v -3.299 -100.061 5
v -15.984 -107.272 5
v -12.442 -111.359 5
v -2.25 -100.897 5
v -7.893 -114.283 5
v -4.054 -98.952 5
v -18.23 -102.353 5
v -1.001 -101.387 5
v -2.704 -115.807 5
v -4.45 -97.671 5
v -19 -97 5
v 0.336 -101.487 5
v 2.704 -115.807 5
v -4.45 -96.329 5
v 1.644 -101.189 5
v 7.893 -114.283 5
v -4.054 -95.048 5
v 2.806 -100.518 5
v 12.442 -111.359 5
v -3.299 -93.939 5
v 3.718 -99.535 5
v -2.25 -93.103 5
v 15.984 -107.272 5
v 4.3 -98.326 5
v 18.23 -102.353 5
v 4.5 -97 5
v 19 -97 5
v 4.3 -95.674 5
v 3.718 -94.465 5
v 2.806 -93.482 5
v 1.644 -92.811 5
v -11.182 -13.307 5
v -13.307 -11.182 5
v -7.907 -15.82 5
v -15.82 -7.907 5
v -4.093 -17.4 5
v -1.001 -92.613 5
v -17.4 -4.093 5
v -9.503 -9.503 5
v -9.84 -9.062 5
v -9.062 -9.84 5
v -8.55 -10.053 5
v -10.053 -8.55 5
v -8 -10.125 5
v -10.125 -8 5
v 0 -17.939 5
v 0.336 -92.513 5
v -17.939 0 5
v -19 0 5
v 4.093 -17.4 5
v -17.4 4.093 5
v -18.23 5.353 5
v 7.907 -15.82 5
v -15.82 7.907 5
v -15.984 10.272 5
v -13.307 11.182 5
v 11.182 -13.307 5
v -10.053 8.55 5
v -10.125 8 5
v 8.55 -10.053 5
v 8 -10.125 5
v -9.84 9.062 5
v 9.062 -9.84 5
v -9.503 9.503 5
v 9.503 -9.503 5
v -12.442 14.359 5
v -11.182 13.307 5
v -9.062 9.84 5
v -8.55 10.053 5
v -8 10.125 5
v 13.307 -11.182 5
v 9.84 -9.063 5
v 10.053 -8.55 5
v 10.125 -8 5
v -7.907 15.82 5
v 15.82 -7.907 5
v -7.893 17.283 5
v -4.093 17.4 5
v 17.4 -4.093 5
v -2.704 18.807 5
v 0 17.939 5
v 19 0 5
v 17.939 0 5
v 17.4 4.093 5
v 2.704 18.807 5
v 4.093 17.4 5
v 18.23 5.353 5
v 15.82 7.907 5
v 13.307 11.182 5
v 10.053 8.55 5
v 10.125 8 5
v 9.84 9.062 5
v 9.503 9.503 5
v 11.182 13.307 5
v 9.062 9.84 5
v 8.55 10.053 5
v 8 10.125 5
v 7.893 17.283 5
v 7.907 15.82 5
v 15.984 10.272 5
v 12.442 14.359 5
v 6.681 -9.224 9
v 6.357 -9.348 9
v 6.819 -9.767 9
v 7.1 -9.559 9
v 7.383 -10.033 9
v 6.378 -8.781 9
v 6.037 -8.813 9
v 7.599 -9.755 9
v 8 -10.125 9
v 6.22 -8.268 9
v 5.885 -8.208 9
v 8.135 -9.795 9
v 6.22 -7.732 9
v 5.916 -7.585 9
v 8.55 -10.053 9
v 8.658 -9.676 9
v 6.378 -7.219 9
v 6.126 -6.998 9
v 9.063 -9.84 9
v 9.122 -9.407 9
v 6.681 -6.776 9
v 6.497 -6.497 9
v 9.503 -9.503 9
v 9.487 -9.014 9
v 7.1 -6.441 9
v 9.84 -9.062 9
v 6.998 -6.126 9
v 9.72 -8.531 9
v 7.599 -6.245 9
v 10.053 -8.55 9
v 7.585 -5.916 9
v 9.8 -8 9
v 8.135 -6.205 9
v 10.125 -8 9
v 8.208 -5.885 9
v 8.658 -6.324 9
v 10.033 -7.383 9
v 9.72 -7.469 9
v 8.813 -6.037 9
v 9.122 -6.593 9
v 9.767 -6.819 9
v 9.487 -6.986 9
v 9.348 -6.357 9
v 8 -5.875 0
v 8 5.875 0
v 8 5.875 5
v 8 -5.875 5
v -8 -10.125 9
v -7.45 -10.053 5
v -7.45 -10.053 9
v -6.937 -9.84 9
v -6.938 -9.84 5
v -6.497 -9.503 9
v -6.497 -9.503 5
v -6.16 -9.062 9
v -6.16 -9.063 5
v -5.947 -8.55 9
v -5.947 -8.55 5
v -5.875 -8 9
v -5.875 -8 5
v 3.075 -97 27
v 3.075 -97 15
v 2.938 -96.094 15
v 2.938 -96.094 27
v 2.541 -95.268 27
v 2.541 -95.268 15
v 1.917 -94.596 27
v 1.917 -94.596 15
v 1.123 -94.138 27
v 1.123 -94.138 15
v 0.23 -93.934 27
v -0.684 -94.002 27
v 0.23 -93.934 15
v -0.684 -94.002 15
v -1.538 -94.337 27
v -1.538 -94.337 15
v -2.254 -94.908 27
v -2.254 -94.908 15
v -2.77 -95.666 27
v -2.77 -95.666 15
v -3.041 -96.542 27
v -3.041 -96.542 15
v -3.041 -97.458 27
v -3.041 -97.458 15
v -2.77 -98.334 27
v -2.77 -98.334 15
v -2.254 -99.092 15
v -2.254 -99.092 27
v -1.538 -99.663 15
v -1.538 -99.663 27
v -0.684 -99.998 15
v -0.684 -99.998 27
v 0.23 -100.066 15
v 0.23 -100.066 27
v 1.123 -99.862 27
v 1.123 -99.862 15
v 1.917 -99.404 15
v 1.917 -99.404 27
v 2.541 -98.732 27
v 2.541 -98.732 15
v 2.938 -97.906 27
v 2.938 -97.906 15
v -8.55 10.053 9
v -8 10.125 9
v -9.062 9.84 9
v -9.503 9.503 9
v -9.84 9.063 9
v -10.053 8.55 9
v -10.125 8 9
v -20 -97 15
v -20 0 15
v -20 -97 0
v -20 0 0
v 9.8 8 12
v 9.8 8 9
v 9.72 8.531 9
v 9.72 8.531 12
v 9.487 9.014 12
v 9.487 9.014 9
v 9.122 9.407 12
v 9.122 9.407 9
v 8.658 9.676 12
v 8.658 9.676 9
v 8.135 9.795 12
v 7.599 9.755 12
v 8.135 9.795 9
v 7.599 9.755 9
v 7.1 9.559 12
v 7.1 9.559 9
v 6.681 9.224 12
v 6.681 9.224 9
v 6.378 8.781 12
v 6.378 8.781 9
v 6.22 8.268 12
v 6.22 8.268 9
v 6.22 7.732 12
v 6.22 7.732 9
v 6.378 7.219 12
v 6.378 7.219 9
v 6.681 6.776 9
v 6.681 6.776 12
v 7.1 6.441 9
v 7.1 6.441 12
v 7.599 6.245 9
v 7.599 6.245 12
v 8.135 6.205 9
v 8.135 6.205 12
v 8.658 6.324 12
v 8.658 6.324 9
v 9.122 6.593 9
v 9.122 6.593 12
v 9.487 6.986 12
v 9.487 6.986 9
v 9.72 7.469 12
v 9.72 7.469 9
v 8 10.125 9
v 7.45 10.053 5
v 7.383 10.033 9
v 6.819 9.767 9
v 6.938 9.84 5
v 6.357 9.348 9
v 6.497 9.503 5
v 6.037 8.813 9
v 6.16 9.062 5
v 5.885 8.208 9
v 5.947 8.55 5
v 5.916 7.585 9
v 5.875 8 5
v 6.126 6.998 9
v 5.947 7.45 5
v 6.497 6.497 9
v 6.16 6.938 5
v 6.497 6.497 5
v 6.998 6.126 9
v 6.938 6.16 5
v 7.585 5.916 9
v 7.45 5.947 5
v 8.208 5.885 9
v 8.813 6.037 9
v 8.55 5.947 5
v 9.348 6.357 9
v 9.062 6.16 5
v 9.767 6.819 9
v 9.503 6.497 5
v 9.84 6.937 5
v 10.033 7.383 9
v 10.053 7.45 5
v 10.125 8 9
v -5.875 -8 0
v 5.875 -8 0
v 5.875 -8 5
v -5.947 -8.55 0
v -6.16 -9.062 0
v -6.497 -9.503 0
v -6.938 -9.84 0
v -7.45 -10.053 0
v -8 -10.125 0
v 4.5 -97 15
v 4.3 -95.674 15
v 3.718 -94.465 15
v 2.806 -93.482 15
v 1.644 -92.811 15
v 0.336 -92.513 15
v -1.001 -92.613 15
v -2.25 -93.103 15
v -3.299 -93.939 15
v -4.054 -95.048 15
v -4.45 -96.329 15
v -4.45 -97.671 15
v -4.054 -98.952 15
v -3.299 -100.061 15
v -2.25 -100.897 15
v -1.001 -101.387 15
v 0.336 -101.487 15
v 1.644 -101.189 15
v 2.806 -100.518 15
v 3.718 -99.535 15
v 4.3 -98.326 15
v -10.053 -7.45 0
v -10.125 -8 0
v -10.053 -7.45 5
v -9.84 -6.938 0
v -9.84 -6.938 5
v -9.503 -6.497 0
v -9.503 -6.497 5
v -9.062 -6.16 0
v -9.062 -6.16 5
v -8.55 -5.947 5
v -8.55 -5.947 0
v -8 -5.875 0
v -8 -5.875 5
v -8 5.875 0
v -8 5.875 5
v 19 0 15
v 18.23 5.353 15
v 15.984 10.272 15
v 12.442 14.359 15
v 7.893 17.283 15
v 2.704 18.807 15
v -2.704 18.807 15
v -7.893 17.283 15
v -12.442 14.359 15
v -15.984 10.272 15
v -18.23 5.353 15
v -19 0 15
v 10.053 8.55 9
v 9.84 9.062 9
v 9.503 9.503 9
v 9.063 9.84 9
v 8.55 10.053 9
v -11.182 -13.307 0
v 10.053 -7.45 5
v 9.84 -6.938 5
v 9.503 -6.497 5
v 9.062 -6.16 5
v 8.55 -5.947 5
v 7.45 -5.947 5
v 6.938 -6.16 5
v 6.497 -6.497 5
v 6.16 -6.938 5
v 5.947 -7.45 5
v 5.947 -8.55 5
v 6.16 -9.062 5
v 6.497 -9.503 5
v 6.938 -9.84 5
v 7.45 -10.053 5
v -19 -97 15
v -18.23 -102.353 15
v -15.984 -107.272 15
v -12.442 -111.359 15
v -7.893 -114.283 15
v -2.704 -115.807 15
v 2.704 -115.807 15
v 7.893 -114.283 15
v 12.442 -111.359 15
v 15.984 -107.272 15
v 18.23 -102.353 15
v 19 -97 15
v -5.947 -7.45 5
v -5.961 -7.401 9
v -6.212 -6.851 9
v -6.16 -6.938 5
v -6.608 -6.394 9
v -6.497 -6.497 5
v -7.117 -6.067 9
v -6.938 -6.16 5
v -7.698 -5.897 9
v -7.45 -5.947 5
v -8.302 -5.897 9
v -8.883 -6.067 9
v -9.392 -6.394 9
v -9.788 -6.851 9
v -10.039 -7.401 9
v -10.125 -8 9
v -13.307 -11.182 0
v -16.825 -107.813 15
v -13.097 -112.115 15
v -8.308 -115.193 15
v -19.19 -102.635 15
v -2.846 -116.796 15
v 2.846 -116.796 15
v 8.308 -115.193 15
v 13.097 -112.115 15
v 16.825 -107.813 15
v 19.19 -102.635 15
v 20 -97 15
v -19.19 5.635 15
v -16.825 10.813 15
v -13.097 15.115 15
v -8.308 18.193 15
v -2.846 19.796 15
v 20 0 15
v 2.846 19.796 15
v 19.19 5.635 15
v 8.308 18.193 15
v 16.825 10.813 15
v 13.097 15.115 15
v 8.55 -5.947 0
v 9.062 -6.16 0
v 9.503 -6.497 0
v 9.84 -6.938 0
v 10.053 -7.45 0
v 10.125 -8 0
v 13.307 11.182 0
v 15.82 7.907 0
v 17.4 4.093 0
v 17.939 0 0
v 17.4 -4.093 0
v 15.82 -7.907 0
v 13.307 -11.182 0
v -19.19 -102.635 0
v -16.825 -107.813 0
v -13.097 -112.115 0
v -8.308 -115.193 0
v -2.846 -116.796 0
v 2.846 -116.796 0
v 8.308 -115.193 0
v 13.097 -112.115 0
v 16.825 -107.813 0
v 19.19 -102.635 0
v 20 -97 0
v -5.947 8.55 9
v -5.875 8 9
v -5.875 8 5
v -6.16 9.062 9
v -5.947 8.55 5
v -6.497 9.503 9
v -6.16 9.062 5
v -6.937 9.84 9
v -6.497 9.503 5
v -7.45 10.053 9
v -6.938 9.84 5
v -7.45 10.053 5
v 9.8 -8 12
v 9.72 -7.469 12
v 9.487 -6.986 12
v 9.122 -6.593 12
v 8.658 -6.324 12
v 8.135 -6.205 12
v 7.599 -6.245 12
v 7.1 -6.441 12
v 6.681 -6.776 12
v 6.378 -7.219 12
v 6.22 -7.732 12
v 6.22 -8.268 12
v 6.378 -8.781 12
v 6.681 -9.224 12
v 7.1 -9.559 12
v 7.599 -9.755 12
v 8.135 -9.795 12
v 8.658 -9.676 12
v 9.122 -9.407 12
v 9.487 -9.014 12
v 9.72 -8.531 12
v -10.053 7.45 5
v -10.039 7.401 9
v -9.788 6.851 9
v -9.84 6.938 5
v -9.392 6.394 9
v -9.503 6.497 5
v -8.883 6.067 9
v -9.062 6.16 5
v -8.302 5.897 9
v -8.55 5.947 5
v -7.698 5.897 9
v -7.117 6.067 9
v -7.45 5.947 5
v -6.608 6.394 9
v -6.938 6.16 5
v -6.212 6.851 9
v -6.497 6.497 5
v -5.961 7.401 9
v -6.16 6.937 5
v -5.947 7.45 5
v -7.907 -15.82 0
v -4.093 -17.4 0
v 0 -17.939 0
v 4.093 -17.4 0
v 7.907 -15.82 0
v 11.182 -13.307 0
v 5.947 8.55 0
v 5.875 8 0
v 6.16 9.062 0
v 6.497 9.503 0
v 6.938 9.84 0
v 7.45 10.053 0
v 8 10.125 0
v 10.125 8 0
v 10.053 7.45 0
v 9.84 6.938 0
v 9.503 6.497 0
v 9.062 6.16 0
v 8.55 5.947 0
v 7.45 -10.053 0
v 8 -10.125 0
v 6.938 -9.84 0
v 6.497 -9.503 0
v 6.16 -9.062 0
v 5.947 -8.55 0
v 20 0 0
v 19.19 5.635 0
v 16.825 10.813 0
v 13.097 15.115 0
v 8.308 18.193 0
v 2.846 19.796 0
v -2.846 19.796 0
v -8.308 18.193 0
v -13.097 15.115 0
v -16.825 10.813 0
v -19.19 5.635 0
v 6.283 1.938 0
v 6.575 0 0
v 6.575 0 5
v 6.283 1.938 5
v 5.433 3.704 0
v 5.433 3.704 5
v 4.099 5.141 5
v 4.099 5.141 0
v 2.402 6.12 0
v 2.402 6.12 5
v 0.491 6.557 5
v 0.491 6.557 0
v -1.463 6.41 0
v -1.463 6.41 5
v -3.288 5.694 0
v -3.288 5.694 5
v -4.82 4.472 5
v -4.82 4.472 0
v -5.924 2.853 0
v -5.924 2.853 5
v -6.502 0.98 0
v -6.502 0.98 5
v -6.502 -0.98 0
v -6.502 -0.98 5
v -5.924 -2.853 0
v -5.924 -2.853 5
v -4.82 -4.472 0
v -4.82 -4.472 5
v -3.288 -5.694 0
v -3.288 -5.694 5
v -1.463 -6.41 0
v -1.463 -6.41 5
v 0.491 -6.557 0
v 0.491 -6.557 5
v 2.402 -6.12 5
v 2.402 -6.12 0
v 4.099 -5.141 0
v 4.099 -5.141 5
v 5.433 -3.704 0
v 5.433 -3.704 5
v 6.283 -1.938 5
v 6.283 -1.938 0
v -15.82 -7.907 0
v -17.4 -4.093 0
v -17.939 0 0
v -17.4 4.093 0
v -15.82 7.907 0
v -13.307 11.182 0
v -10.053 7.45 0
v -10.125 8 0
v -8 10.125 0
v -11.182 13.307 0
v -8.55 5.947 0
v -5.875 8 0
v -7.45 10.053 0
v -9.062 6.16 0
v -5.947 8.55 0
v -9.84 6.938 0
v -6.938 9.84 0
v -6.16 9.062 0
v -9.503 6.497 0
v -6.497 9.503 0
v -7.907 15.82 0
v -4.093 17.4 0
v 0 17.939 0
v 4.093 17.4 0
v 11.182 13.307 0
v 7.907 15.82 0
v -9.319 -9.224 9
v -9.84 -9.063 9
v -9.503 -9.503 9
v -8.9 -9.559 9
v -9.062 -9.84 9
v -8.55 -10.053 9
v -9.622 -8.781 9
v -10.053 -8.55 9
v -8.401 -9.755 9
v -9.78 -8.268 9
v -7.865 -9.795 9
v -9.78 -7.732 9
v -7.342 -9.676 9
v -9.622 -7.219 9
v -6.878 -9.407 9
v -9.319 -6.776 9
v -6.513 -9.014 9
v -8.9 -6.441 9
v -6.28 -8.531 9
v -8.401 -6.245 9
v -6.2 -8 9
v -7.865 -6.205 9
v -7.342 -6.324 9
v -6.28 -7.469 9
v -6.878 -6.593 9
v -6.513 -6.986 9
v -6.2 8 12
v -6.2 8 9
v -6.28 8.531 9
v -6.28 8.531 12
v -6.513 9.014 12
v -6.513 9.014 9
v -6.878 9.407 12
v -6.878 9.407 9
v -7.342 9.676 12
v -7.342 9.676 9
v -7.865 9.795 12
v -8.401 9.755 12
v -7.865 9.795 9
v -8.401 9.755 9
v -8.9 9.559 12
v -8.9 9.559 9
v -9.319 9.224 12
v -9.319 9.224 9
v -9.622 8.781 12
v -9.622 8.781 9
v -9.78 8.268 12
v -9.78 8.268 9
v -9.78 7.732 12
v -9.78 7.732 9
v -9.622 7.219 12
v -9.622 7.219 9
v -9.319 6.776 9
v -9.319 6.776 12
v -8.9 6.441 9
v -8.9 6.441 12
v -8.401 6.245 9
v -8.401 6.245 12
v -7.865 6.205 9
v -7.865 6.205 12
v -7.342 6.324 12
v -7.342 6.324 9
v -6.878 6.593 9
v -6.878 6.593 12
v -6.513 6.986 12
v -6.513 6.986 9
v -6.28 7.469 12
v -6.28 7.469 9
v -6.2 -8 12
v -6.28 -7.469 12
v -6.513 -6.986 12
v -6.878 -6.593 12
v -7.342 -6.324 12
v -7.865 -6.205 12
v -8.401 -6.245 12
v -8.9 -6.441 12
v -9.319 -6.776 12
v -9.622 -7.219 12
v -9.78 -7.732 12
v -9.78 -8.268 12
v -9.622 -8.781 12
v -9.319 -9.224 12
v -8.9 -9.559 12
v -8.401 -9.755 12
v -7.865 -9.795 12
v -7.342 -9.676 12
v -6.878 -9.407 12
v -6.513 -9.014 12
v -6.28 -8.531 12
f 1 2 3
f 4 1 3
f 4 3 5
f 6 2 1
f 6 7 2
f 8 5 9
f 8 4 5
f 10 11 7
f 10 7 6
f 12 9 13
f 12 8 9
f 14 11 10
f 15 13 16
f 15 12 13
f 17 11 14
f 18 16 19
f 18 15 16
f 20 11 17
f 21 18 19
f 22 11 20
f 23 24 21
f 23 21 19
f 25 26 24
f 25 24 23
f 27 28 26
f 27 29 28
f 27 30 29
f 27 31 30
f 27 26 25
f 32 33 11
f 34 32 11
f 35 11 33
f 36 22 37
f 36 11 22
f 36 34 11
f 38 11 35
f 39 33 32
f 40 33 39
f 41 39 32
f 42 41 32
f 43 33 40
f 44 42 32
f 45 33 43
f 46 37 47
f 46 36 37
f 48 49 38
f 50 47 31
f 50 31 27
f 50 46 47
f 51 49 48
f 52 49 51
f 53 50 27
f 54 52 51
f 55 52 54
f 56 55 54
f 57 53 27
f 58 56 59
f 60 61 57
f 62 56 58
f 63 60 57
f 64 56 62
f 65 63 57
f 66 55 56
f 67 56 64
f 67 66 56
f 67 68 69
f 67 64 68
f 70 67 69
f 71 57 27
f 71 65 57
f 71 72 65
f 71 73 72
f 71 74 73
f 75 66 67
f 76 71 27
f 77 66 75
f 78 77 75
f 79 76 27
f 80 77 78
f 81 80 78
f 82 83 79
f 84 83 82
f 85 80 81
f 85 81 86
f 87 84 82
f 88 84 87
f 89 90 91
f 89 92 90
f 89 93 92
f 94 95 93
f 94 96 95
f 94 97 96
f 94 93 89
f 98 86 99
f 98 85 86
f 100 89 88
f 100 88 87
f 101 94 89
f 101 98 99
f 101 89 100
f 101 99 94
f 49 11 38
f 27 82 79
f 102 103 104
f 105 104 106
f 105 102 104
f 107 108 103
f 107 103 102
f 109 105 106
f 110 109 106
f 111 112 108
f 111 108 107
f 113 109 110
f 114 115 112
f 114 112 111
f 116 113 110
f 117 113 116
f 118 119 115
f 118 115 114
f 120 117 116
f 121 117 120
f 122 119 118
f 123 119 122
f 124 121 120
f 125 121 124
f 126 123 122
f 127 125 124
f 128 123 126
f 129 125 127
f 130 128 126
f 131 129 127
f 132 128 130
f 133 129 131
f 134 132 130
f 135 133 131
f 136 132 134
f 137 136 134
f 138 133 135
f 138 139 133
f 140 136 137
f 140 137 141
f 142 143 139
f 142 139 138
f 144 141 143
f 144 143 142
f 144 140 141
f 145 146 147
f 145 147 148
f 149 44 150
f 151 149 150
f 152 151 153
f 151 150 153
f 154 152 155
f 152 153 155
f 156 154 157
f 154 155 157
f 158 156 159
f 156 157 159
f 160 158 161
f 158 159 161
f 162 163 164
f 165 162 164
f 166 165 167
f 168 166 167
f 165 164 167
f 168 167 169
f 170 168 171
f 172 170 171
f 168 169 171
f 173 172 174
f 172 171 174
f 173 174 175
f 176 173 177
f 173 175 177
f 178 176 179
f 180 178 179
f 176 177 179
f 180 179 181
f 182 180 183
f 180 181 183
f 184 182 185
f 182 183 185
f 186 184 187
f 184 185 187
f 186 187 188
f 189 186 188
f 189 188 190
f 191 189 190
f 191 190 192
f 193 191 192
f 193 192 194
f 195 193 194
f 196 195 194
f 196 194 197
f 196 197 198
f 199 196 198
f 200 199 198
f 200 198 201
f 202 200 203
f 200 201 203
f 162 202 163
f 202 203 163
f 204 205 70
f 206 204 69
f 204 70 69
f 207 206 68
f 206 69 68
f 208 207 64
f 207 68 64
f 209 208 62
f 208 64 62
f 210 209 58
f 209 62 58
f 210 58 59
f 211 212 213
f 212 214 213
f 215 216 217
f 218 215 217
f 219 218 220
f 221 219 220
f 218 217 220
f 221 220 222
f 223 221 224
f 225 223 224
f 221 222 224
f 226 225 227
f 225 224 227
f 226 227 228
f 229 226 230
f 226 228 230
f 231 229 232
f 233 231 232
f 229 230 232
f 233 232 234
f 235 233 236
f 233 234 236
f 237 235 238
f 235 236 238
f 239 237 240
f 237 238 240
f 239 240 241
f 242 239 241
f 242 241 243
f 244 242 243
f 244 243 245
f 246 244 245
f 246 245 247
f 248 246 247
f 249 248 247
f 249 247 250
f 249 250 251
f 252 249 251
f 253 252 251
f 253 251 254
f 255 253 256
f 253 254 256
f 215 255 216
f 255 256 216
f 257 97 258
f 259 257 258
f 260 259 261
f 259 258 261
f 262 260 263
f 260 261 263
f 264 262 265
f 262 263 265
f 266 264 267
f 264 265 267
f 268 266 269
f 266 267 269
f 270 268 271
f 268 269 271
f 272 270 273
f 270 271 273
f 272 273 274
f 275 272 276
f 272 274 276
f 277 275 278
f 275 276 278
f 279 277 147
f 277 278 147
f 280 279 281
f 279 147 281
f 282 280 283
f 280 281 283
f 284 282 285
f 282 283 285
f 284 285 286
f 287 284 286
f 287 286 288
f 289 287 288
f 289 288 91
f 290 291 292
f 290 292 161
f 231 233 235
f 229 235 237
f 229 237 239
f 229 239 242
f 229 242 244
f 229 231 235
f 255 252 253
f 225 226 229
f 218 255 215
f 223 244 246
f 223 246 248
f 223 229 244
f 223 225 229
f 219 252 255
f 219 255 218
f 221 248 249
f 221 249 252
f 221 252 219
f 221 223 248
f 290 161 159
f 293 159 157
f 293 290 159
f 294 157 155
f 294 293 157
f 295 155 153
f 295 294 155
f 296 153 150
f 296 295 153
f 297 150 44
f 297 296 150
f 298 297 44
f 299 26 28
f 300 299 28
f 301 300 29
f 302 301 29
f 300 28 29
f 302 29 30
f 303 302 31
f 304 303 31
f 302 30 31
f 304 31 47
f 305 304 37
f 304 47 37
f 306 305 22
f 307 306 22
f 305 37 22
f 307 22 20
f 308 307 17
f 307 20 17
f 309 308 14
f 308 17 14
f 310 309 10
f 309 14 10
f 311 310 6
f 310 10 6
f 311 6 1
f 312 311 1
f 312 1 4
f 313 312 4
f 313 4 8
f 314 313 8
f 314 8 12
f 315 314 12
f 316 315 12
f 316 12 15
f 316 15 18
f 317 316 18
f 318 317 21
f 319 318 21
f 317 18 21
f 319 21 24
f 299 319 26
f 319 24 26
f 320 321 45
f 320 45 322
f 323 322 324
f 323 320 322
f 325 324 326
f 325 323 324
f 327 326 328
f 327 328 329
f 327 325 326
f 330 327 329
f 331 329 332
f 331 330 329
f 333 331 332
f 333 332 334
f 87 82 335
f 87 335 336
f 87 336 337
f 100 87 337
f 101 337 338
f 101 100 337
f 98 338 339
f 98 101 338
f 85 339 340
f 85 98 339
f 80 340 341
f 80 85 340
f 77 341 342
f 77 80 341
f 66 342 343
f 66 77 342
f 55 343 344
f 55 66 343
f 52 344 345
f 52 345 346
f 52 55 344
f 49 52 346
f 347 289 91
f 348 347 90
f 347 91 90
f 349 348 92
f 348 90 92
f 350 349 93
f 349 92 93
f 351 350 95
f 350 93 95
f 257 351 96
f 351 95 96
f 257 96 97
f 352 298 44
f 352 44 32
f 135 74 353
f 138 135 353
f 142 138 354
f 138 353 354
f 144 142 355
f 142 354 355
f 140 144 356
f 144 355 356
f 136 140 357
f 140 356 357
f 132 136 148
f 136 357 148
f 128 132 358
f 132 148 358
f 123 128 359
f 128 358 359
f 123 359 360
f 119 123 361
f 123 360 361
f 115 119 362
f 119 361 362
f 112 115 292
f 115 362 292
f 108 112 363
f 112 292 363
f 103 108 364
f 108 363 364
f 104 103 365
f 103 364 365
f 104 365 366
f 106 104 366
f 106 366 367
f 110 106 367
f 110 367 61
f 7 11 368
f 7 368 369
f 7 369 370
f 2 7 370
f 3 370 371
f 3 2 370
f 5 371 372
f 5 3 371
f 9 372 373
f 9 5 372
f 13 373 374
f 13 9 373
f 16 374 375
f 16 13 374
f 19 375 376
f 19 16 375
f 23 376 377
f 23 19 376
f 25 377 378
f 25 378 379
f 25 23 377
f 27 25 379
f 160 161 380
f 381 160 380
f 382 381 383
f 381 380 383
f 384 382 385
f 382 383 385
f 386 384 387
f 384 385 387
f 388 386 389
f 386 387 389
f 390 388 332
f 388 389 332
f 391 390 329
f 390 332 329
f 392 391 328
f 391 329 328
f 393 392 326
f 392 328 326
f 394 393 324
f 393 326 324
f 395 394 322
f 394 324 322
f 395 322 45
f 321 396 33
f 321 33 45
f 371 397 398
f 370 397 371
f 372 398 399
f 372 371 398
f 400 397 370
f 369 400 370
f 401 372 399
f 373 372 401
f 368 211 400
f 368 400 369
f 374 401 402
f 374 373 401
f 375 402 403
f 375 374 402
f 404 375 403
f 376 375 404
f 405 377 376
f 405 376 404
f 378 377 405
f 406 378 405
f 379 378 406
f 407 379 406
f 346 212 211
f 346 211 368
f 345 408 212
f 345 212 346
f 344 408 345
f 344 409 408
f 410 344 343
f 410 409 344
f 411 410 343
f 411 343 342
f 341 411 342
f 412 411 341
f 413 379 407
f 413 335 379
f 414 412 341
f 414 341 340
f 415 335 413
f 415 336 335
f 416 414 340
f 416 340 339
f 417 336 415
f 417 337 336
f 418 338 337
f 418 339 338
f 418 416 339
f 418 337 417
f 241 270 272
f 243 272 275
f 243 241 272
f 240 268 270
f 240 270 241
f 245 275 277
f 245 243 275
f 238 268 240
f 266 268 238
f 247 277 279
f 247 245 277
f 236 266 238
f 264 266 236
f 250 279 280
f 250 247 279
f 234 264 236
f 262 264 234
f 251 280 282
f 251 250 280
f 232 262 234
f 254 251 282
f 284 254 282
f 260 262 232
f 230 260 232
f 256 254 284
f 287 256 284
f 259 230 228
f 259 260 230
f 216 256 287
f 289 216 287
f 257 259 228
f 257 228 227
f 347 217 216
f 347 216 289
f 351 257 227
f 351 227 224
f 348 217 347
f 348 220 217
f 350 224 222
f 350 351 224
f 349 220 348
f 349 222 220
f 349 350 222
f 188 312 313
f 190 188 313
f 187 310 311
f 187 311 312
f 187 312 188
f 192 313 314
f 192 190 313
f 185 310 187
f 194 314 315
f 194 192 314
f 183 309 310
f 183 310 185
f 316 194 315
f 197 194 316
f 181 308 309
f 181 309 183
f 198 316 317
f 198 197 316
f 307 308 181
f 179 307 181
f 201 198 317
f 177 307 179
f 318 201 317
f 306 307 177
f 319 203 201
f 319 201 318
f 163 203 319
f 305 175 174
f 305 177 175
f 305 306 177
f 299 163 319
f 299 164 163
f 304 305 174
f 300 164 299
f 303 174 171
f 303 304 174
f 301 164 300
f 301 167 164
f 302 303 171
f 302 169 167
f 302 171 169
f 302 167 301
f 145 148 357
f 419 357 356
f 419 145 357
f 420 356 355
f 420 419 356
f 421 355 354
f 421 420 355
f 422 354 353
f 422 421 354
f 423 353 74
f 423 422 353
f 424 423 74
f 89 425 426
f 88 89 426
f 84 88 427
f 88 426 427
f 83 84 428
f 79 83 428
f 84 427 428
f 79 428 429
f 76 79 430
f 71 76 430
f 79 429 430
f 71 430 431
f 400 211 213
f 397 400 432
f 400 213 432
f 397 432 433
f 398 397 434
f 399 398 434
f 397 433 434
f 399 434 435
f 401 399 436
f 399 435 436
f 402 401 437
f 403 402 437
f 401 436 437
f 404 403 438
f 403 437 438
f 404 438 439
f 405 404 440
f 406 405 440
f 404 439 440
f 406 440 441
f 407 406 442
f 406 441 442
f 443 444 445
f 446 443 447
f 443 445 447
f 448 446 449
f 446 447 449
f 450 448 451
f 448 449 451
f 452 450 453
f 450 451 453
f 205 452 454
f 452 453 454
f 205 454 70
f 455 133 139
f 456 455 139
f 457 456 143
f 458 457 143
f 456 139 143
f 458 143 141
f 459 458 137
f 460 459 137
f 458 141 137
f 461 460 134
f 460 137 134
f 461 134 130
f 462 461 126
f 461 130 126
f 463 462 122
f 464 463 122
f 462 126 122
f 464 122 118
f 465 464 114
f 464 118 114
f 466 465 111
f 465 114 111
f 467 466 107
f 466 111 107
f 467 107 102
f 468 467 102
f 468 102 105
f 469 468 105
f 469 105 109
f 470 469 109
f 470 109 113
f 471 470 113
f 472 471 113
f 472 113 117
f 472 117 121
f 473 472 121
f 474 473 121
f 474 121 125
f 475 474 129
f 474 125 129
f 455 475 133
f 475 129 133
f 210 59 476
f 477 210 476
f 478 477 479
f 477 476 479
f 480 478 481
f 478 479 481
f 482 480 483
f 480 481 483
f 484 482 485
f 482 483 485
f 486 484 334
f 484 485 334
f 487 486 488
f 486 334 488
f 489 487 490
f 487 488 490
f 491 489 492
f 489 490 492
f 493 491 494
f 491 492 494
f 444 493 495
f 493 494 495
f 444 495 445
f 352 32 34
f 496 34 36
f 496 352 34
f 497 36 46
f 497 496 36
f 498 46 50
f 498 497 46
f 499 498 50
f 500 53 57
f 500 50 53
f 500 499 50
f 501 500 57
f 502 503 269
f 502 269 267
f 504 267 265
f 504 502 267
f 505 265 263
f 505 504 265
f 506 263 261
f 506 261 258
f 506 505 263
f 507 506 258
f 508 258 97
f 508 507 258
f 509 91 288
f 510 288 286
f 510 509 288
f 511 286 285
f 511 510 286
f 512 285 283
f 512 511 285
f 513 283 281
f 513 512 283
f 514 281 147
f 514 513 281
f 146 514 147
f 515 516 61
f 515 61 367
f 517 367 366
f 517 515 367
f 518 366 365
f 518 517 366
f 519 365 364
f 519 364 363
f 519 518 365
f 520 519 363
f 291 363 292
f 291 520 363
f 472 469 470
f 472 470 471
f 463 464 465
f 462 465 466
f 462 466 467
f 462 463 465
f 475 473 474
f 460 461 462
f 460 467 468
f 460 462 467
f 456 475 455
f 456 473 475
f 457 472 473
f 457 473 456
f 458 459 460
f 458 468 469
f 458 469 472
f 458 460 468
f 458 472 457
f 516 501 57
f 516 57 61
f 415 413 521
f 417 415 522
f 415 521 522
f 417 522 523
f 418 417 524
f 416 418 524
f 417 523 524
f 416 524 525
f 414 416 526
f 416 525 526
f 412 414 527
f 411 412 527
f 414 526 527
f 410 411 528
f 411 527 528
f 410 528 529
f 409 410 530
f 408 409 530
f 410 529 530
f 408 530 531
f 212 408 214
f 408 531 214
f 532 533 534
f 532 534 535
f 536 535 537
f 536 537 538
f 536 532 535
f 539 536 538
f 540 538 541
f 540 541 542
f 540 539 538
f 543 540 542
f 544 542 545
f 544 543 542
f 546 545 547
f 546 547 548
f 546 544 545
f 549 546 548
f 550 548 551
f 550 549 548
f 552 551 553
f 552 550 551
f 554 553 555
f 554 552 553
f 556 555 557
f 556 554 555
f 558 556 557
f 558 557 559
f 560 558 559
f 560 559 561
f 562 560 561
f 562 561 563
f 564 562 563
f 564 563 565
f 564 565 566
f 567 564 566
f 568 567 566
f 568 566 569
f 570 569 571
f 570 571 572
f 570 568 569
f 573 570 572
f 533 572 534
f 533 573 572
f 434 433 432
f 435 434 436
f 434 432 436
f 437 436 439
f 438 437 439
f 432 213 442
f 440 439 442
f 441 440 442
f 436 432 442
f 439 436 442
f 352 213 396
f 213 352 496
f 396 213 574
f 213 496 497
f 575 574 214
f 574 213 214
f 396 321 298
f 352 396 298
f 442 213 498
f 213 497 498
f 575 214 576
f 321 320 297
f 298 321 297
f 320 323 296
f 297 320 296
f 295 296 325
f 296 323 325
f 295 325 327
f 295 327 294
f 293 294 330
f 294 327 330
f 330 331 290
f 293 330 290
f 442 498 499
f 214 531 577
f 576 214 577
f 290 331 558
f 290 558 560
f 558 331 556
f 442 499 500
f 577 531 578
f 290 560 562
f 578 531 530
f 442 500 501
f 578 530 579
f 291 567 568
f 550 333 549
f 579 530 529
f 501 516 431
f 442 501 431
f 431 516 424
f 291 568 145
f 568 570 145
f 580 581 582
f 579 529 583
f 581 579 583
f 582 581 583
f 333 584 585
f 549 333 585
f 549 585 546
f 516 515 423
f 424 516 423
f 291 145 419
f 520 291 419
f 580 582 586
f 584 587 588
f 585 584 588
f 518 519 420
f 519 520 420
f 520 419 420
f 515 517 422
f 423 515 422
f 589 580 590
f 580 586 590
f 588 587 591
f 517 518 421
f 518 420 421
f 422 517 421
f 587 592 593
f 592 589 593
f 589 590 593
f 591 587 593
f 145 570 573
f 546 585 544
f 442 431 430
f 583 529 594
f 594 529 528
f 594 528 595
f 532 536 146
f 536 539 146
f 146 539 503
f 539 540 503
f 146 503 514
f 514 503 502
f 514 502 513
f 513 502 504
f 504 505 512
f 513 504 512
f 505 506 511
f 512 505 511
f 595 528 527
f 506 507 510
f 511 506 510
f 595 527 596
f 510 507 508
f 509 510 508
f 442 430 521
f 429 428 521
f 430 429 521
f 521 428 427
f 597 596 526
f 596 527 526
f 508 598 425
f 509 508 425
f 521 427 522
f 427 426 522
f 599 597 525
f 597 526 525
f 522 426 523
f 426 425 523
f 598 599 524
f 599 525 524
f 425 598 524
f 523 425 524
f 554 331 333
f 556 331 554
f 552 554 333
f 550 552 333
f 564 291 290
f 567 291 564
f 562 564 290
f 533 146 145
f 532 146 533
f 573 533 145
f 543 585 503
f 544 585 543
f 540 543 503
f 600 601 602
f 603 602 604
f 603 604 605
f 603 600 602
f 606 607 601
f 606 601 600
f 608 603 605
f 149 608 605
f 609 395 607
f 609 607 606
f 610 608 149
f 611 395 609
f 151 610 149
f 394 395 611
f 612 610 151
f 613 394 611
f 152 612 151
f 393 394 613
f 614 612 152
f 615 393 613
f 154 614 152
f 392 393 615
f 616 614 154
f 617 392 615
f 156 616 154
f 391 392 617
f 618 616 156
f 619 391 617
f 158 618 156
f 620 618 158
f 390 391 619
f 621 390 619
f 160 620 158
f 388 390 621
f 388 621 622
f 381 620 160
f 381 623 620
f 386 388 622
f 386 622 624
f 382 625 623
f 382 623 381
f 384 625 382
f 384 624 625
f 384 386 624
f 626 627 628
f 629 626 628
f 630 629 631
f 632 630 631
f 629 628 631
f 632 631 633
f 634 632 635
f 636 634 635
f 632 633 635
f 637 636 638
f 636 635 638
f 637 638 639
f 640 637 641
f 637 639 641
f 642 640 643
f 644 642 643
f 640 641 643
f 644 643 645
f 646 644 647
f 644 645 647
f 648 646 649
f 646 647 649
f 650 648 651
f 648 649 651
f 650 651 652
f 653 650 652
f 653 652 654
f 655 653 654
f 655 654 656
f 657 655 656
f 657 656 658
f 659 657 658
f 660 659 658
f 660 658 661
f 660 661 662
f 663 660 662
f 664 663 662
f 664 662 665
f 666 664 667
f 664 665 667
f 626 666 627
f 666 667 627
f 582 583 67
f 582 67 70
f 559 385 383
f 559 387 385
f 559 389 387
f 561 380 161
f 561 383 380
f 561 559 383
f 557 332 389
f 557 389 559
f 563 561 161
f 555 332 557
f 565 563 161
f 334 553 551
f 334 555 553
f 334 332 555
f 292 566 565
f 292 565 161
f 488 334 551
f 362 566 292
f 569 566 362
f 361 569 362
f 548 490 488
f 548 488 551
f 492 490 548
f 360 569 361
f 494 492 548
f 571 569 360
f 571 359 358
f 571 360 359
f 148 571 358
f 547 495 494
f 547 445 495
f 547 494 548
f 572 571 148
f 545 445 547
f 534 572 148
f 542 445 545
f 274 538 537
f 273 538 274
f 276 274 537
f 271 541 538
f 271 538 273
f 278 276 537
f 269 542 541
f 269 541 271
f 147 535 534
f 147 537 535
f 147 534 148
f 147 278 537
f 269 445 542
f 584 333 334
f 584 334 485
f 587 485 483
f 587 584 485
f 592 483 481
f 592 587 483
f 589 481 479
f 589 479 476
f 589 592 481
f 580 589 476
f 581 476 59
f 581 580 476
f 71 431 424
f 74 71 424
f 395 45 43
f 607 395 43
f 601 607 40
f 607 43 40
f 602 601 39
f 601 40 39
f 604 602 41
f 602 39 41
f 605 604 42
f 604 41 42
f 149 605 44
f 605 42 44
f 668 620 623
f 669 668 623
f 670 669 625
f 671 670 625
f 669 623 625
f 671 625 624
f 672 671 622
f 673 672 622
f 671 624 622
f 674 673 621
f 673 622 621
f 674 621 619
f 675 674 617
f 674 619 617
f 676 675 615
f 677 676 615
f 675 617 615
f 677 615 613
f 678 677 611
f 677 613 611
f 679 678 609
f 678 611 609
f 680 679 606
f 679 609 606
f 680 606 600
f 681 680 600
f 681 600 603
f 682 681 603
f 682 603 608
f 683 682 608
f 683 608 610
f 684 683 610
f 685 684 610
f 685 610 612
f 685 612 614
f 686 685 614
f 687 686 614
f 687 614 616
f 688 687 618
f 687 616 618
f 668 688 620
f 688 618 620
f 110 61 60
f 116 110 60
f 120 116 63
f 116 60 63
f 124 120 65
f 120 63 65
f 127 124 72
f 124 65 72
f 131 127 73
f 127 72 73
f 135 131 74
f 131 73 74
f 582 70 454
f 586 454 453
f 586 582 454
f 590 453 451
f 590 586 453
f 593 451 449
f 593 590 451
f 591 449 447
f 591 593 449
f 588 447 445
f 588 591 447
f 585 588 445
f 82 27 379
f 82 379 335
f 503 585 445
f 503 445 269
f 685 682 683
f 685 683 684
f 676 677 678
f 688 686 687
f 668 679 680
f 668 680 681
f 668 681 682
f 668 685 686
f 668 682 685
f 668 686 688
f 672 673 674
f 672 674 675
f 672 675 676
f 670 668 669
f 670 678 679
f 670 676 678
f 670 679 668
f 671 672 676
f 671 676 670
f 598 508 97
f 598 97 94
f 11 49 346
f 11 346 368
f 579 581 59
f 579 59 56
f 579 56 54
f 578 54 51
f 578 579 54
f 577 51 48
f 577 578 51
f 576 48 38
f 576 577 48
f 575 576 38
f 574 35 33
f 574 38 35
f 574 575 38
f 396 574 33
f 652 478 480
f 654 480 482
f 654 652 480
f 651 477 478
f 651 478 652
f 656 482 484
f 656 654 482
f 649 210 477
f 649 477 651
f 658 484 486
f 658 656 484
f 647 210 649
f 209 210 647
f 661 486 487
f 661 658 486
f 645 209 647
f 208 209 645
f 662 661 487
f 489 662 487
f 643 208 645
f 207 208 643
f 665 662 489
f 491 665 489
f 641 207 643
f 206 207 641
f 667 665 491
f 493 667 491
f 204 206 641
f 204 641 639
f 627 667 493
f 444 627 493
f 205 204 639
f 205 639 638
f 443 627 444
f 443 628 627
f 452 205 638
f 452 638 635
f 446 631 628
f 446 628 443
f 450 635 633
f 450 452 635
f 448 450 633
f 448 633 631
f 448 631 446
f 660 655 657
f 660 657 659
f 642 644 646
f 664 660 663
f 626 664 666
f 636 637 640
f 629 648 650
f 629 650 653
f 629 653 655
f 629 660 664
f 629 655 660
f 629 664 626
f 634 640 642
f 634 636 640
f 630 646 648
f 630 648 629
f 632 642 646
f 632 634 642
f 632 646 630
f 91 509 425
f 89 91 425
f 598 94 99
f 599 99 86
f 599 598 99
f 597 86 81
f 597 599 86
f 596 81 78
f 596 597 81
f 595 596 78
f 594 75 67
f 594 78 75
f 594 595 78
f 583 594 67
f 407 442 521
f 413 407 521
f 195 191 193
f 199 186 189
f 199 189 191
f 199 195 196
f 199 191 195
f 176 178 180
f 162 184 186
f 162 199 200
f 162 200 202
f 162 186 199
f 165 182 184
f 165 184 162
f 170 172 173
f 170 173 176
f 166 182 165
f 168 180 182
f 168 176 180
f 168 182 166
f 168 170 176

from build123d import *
from build123d.topology import SkipClean

# Parameters (mm, degrees)
SKETCH2_R           = 6.575
BOSS_EXTRUDE1_DEPTH = 5
SKETCH3_R           = 4.5
BOSS_EXTRUDE2_DEPTH = 10
SKETCH4_R           = 2.125
BOSS_EXTRUDE3_DEPTH = 4
SKETCH5_R           = 1.8
BOSS_EXTRUDE4_DEPTH = 3
BOSS_EXTRUDE5_DEPTH = 10
CUT_EXTRUDE1_START  = -10
CUT_EXTRUDE1_DEPTH  = 10
SKETCH8_R           = 3.075
BOSS_EXTRUDE6_DEPTH = 12
CUT_EXTRUDE2_DEPTH  = 10


with BuildPart() as part:
    # Sketch2 → Boss-Extrude1 (new body)
    with BuildSketch(Plane.XY):
        with BuildLine():
            Line((-20, 0), (-20, -97))
            ThreePointArc((-20, -97), (0, -117), (20, -97))
            Line((20, -97), (20, 0))
            ThreePointArc((20, 0), (0, 20), (-20, 0))
        make_face()
        Circle(SKETCH2_R, mode=Mode.SUBTRACT)
    extrude(amount=BOSS_EXTRUDE1_DEPTH)

    # Sketch3 → Boss-Extrude2 (add)
    with BuildSketch(Plane.XY.offset(5)):
        with Locations((0, -97)):
            Circle(SKETCH3_R)
    extrude(amount=BOSS_EXTRUDE2_DEPTH)

    # Sketch4 → Boss-Extrude3 (add)
    with BuildSketch(Plane.XY.offset(5)):
        with Locations((-8, 8)):
            Circle(SKETCH4_R)
        with Locations((8, 8)):
            Circle(SKETCH4_R)
        with Locations((8, -8)):
            Circle(SKETCH4_R)
        with Locations((-8, -8)):
            Circle(SKETCH4_R)
    extrude(amount=BOSS_EXTRUDE3_DEPTH)

    # Sketch5 → Boss-Extrude4 (add)
    with BuildSketch(Plane.XY.offset(9)):
        with Locations((-8, 8)):
            Circle(SKETCH5_R)
        with Locations((8, 8)):
            Circle(SKETCH5_R)
        with Locations((8, -8)):
            Circle(SKETCH5_R)
        with Locations((-8, -8)):
            Circle(SKETCH5_R)
    extrude(amount=BOSS_EXTRUDE4_DEPTH)

    # Sketch6 → Boss-Extrude5 (add)
    with BuildSketch(Plane.XY.offset(5)):
        with BuildLine():
            Line((20, -97), (20, 0))
            ThreePointArc((20, 0), (0, 20), (-20, 0))
            Line((-20, 0), (-20, -97))
            ThreePointArc((-20, -97), (0, -117), (20, -97))
        make_face()
        with BuildLine():
            Line((-19, 0), (-19, -97))
            ThreePointArc((-19, -97), (0, -116), (19, -97))
            Line((19, -97), (19, 0))
            ThreePointArc((19, 0), (0, 19), (-19, 0))
        make_face(mode=Mode.SUBTRACT)
    extrude(amount=BOSS_EXTRUDE5_DEPTH)

    # Sketch7 → Cut-Extrude1 (cut)
    with BuildSketch(Plane.XY.offset(5).offset(CUT_EXTRUDE1_START)):
        with BuildLine():
            Line((-10.125, 8), (-10.125, -8))
            ThreePointArc((-10.125, -8), (-9.50260191, -6.49739809), (-8, -5.875))
            Line((-8, -5.875), (-8, 5.875))
            ThreePointArc((-8, 5.875), (-9.50260191, 6.49739809), (-10.125, 8))
        make_face()
        with BuildLine():
            Line((-8, -10.125), (8, -10.125))
            ThreePointArc((8, -10.125), (6.49739809, -9.50260191), (5.875, -8))
            Line((5.875, -8), (-5.875, -8))
            ThreePointArc((-5.875, -8), (-6.49739809, -9.50260191), (-8, -10.125))
        make_face()
        with BuildLine():
            Line((10.125, -8), (10.125, 8))
            ThreePointArc((10.125, 8), (9.50260191, 6.49739809), (8, 5.875))
            Line((8, 5.875), (8, -5.875))
            ThreePointArc((8, -5.875), (9.50260191, -6.49739809), (10.125, -8))
        make_face()
        with BuildLine():
            Line((8, 10.125), (-8, 10.125))
            ThreePointArc((-8, 10.125), (-6.49739809, 9.50260191), (-5.875, 8))
            Line((-5.875, 8), (5.875, 8))
            ThreePointArc((5.875, 8), (6.49739809, 9.50260191), (8, 10.125))
        make_face()
    extrude(amount=CUT_EXTRUDE1_DEPTH, mode=Mode.SUBTRACT)

    # Sketch8 → Boss-Extrude6 (add)
    with BuildSketch(Plane.XY.offset(15)):
        with Locations((0, -97)):
            Circle(SKETCH8_R)
    extrude(amount=BOSS_EXTRUDE6_DEPTH)

    # Sketch10 → Cut-Extrude2 (cut)
    with SkipClean():  # the faces are left unmerged after this step: merging them gives an invalid solid
        with BuildSketch(Plane(origin=(0, 0, 0), x_dir=(-1, 0, 0), z_dir=(0, 0, -1))):
            with BuildLine():
                Line((-8, 10.125), (-11.181980515, 13.306980515))
                ThreePointArc((-11.181980515, 13.306980515), (0, 17.938708499), (11.181980515, 13.306980515))
                Line((11.181980515, 13.306980515), (8, 10.125))
                Line((8, 10.125), (-8, 10.125))
            make_face()
            with BuildLine():
                Line((-10.125, 8), (-13.306980515, 11.181980515))
                ThreePointArc((-13.306980515, 11.181980515), (-17.938708499, 0), (-13.306980515, -11.181980515))
                Line((-13.306980515, -11.181980515), (-10.125, -8))
                Line((-10.125, -8), (-10.125, 8))
            make_face()
            with BuildLine():
                Line((10.125, 8), (13.306980515, 11.181980515))
                ThreePointArc((13.306980515, 11.181980515), (17.938708499, 0), (13.306980515, -11.181980515))
                Line((13.306980515, -11.181980515), (10.125, -8))
                Line((10.125, -8), (10.125, 8))
            make_face()
            with BuildLine():
                Line((8, -10.125), (11.181980515, -13.306980515))
                ThreePointArc((11.181980515, -13.306980515), (0, -17.938708499), (-11.181980515, -13.306980515))
                Line((-11.181980515, -13.306980515), (-8, -10.125))
                Line((-8, -10.125), (8, -10.125))
            make_face()
        extrude(amount=-CUT_EXTRUDE2_DEPTH, mode=Mode.SUBTRACT)


solid = part.part
